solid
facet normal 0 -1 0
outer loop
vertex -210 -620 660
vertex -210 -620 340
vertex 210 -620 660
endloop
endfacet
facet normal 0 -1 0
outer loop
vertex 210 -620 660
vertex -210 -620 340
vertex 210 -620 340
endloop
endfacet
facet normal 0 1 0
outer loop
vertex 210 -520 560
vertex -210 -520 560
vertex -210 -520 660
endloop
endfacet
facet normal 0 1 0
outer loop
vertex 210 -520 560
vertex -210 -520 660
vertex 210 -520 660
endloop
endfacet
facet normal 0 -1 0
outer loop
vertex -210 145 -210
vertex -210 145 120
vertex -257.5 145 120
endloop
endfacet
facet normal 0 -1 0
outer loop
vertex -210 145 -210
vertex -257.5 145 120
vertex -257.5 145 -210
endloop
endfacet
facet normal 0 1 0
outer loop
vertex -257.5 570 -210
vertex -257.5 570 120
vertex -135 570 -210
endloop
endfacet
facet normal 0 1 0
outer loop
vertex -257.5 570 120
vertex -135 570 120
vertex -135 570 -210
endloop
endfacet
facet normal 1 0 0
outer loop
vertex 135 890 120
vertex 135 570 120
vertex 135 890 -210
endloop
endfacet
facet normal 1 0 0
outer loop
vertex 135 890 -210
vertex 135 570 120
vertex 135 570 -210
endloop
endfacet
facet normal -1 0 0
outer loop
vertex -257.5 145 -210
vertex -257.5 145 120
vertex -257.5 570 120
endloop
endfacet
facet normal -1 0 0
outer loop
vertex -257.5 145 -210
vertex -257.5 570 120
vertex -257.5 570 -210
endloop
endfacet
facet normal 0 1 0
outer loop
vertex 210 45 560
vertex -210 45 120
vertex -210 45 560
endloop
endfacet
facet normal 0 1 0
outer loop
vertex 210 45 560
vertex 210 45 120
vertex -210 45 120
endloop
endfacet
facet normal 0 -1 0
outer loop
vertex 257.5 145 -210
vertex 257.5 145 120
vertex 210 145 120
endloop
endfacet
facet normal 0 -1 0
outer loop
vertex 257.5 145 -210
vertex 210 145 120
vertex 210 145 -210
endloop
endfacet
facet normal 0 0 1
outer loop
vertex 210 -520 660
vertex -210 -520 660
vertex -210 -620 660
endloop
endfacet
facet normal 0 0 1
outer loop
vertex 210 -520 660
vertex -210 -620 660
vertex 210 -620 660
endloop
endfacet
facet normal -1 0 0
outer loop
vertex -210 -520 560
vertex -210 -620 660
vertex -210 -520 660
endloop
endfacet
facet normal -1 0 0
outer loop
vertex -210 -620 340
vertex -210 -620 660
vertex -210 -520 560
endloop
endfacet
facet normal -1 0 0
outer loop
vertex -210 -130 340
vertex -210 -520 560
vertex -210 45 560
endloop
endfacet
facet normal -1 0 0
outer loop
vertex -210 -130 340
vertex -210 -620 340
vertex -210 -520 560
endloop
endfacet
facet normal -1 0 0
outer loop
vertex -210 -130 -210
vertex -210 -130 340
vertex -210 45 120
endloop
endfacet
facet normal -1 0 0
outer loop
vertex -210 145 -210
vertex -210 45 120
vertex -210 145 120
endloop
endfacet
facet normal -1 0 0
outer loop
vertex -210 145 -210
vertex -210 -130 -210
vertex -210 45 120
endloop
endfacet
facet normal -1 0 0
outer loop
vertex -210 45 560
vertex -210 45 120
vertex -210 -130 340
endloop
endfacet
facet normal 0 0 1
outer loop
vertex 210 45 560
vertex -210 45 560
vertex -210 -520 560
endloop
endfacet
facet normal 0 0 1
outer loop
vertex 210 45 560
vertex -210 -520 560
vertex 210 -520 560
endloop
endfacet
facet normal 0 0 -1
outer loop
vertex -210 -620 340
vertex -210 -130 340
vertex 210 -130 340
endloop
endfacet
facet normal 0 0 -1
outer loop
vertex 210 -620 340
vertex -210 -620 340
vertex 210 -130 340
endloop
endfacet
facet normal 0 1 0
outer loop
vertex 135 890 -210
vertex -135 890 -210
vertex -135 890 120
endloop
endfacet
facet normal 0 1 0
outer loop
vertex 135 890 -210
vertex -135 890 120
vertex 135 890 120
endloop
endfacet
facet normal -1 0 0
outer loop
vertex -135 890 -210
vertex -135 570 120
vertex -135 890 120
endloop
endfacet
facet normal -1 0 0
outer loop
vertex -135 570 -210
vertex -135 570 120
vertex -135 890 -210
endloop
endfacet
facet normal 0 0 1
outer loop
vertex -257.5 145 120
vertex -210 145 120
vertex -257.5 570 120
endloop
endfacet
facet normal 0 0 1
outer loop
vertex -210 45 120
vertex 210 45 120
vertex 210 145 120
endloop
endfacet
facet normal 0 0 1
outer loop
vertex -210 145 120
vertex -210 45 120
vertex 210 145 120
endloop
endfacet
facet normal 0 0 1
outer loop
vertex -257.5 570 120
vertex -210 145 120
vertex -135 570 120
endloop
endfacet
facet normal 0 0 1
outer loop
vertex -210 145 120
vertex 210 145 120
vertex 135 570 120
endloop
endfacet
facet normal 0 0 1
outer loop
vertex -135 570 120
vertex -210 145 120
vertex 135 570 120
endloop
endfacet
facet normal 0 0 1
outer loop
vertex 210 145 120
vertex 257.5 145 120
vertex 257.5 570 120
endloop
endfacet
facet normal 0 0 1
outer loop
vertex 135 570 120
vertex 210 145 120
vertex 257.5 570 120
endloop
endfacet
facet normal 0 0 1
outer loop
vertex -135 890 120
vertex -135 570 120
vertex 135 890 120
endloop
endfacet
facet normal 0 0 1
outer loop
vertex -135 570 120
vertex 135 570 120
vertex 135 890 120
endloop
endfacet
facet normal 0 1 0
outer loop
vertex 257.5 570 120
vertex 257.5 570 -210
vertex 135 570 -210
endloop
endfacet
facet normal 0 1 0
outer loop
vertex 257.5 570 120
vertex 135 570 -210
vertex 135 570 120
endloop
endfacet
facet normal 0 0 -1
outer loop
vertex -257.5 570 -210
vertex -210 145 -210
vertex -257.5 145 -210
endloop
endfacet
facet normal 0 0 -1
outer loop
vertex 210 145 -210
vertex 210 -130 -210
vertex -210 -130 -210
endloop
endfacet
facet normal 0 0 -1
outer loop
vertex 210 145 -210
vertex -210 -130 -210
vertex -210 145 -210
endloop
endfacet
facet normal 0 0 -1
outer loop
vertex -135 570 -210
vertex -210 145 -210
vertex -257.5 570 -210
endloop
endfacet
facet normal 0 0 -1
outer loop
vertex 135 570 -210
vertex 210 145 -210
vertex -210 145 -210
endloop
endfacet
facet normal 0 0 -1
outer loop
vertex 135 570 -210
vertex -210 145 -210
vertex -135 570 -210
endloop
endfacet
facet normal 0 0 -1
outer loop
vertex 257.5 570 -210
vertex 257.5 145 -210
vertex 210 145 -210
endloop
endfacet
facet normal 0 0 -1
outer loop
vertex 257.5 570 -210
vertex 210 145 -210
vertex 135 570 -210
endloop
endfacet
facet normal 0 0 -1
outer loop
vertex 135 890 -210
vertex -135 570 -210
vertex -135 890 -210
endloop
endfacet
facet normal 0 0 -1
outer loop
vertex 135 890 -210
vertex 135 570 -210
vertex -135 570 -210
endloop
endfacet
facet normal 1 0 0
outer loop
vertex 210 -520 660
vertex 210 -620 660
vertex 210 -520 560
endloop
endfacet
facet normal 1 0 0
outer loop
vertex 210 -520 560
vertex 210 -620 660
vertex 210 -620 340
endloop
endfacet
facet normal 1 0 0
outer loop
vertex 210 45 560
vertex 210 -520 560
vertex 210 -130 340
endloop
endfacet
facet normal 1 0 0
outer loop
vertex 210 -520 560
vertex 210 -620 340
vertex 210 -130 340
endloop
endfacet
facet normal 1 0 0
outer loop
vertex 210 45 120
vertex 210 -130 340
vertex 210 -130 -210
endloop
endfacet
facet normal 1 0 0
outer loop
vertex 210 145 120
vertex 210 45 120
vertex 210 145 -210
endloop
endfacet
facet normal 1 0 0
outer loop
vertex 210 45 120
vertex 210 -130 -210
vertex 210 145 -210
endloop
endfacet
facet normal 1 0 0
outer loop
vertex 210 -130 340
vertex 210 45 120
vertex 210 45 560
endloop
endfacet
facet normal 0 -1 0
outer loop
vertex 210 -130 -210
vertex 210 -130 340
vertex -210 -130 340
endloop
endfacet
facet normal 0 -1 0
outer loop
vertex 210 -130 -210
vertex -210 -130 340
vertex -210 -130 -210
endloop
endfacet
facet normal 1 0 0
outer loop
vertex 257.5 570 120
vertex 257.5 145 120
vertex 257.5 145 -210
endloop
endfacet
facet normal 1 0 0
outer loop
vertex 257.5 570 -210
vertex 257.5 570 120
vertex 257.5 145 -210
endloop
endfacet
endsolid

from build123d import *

# Parameters (mm, degrees)
BOSS_EXTRUDE1_DEPTH = 210
SKETCH3_W           = 270
SKETCH3_H           = 330
BOSS_EXTRUDE2_DEPTH = 320
SKETCH4_W           = 330
SKETCH4_H           = 425
BOSS_EXTRUDE3_DEPTH = 257.5
SKETCH5_W           = 420
SKETCH5_H           = 220
BOSS_EXTRUDE4_DEPTH = 490
SKETCH6_W           = 420
SKETCH6_H           = 100
BOSS_EXTRUDE5_DEPTH = 100


with BuildPart() as part:
    # Sketch2 → Boss-Extrude1 (new, symmetric)
    with BuildSketch(Plane(origin=(0, 0, 0), x_dir=(0, 0, -1), z_dir=(1, 0, 0))):
        Polygon((-560, -130), (210, -130), (210, 570), (-120, 570), (-120, 45), (-560, 45), align=None)
    extrude(amount=BOSS_EXTRUDE1_DEPTH, both=True)

    # Sketch3 → Boss-Extrude2 (add)
    with BuildSketch(Plane(origin=(0, 570, 0), x_dir=(1, 0, 0), z_dir=(0, 1, 0))):
        with Locations((0, 45)):
            Rectangle(SKETCH3_W, SKETCH3_H)
    extrude(amount=BOSS_EXTRUDE2_DEPTH)

    # Sketch4 → Boss-Extrude3 (add, symmetric)
    with BuildSketch(Plane(origin=(0, 0, 0), x_dir=(0, 0, -1), z_dir=(1, 0, 0))):
        with Locations((45, 357.5)):
            Rectangle(SKETCH4_W, SKETCH4_H)
    extrude(amount=BOSS_EXTRUDE3_DEPTH, both=True)

    # Sketch5 → Boss-Extrude4 (add)
    with BuildSketch(Plane.XZ.offset(130)):
        with Locations((0, 450)):
            Rectangle(SKETCH5_W, SKETCH5_H)
    extrude(amount=BOSS_EXTRUDE4_DEPTH)

    # Sketch6 → Boss-Extrude5 (add)
    with BuildSketch(Plane.XY.offset(560)):
        with Locations((0, -570)):
            Rectangle(SKETCH6_W, SKETCH6_H)
    extrude(amount=BOSS_EXTRUDE5_DEPTH)


solid = part.part
